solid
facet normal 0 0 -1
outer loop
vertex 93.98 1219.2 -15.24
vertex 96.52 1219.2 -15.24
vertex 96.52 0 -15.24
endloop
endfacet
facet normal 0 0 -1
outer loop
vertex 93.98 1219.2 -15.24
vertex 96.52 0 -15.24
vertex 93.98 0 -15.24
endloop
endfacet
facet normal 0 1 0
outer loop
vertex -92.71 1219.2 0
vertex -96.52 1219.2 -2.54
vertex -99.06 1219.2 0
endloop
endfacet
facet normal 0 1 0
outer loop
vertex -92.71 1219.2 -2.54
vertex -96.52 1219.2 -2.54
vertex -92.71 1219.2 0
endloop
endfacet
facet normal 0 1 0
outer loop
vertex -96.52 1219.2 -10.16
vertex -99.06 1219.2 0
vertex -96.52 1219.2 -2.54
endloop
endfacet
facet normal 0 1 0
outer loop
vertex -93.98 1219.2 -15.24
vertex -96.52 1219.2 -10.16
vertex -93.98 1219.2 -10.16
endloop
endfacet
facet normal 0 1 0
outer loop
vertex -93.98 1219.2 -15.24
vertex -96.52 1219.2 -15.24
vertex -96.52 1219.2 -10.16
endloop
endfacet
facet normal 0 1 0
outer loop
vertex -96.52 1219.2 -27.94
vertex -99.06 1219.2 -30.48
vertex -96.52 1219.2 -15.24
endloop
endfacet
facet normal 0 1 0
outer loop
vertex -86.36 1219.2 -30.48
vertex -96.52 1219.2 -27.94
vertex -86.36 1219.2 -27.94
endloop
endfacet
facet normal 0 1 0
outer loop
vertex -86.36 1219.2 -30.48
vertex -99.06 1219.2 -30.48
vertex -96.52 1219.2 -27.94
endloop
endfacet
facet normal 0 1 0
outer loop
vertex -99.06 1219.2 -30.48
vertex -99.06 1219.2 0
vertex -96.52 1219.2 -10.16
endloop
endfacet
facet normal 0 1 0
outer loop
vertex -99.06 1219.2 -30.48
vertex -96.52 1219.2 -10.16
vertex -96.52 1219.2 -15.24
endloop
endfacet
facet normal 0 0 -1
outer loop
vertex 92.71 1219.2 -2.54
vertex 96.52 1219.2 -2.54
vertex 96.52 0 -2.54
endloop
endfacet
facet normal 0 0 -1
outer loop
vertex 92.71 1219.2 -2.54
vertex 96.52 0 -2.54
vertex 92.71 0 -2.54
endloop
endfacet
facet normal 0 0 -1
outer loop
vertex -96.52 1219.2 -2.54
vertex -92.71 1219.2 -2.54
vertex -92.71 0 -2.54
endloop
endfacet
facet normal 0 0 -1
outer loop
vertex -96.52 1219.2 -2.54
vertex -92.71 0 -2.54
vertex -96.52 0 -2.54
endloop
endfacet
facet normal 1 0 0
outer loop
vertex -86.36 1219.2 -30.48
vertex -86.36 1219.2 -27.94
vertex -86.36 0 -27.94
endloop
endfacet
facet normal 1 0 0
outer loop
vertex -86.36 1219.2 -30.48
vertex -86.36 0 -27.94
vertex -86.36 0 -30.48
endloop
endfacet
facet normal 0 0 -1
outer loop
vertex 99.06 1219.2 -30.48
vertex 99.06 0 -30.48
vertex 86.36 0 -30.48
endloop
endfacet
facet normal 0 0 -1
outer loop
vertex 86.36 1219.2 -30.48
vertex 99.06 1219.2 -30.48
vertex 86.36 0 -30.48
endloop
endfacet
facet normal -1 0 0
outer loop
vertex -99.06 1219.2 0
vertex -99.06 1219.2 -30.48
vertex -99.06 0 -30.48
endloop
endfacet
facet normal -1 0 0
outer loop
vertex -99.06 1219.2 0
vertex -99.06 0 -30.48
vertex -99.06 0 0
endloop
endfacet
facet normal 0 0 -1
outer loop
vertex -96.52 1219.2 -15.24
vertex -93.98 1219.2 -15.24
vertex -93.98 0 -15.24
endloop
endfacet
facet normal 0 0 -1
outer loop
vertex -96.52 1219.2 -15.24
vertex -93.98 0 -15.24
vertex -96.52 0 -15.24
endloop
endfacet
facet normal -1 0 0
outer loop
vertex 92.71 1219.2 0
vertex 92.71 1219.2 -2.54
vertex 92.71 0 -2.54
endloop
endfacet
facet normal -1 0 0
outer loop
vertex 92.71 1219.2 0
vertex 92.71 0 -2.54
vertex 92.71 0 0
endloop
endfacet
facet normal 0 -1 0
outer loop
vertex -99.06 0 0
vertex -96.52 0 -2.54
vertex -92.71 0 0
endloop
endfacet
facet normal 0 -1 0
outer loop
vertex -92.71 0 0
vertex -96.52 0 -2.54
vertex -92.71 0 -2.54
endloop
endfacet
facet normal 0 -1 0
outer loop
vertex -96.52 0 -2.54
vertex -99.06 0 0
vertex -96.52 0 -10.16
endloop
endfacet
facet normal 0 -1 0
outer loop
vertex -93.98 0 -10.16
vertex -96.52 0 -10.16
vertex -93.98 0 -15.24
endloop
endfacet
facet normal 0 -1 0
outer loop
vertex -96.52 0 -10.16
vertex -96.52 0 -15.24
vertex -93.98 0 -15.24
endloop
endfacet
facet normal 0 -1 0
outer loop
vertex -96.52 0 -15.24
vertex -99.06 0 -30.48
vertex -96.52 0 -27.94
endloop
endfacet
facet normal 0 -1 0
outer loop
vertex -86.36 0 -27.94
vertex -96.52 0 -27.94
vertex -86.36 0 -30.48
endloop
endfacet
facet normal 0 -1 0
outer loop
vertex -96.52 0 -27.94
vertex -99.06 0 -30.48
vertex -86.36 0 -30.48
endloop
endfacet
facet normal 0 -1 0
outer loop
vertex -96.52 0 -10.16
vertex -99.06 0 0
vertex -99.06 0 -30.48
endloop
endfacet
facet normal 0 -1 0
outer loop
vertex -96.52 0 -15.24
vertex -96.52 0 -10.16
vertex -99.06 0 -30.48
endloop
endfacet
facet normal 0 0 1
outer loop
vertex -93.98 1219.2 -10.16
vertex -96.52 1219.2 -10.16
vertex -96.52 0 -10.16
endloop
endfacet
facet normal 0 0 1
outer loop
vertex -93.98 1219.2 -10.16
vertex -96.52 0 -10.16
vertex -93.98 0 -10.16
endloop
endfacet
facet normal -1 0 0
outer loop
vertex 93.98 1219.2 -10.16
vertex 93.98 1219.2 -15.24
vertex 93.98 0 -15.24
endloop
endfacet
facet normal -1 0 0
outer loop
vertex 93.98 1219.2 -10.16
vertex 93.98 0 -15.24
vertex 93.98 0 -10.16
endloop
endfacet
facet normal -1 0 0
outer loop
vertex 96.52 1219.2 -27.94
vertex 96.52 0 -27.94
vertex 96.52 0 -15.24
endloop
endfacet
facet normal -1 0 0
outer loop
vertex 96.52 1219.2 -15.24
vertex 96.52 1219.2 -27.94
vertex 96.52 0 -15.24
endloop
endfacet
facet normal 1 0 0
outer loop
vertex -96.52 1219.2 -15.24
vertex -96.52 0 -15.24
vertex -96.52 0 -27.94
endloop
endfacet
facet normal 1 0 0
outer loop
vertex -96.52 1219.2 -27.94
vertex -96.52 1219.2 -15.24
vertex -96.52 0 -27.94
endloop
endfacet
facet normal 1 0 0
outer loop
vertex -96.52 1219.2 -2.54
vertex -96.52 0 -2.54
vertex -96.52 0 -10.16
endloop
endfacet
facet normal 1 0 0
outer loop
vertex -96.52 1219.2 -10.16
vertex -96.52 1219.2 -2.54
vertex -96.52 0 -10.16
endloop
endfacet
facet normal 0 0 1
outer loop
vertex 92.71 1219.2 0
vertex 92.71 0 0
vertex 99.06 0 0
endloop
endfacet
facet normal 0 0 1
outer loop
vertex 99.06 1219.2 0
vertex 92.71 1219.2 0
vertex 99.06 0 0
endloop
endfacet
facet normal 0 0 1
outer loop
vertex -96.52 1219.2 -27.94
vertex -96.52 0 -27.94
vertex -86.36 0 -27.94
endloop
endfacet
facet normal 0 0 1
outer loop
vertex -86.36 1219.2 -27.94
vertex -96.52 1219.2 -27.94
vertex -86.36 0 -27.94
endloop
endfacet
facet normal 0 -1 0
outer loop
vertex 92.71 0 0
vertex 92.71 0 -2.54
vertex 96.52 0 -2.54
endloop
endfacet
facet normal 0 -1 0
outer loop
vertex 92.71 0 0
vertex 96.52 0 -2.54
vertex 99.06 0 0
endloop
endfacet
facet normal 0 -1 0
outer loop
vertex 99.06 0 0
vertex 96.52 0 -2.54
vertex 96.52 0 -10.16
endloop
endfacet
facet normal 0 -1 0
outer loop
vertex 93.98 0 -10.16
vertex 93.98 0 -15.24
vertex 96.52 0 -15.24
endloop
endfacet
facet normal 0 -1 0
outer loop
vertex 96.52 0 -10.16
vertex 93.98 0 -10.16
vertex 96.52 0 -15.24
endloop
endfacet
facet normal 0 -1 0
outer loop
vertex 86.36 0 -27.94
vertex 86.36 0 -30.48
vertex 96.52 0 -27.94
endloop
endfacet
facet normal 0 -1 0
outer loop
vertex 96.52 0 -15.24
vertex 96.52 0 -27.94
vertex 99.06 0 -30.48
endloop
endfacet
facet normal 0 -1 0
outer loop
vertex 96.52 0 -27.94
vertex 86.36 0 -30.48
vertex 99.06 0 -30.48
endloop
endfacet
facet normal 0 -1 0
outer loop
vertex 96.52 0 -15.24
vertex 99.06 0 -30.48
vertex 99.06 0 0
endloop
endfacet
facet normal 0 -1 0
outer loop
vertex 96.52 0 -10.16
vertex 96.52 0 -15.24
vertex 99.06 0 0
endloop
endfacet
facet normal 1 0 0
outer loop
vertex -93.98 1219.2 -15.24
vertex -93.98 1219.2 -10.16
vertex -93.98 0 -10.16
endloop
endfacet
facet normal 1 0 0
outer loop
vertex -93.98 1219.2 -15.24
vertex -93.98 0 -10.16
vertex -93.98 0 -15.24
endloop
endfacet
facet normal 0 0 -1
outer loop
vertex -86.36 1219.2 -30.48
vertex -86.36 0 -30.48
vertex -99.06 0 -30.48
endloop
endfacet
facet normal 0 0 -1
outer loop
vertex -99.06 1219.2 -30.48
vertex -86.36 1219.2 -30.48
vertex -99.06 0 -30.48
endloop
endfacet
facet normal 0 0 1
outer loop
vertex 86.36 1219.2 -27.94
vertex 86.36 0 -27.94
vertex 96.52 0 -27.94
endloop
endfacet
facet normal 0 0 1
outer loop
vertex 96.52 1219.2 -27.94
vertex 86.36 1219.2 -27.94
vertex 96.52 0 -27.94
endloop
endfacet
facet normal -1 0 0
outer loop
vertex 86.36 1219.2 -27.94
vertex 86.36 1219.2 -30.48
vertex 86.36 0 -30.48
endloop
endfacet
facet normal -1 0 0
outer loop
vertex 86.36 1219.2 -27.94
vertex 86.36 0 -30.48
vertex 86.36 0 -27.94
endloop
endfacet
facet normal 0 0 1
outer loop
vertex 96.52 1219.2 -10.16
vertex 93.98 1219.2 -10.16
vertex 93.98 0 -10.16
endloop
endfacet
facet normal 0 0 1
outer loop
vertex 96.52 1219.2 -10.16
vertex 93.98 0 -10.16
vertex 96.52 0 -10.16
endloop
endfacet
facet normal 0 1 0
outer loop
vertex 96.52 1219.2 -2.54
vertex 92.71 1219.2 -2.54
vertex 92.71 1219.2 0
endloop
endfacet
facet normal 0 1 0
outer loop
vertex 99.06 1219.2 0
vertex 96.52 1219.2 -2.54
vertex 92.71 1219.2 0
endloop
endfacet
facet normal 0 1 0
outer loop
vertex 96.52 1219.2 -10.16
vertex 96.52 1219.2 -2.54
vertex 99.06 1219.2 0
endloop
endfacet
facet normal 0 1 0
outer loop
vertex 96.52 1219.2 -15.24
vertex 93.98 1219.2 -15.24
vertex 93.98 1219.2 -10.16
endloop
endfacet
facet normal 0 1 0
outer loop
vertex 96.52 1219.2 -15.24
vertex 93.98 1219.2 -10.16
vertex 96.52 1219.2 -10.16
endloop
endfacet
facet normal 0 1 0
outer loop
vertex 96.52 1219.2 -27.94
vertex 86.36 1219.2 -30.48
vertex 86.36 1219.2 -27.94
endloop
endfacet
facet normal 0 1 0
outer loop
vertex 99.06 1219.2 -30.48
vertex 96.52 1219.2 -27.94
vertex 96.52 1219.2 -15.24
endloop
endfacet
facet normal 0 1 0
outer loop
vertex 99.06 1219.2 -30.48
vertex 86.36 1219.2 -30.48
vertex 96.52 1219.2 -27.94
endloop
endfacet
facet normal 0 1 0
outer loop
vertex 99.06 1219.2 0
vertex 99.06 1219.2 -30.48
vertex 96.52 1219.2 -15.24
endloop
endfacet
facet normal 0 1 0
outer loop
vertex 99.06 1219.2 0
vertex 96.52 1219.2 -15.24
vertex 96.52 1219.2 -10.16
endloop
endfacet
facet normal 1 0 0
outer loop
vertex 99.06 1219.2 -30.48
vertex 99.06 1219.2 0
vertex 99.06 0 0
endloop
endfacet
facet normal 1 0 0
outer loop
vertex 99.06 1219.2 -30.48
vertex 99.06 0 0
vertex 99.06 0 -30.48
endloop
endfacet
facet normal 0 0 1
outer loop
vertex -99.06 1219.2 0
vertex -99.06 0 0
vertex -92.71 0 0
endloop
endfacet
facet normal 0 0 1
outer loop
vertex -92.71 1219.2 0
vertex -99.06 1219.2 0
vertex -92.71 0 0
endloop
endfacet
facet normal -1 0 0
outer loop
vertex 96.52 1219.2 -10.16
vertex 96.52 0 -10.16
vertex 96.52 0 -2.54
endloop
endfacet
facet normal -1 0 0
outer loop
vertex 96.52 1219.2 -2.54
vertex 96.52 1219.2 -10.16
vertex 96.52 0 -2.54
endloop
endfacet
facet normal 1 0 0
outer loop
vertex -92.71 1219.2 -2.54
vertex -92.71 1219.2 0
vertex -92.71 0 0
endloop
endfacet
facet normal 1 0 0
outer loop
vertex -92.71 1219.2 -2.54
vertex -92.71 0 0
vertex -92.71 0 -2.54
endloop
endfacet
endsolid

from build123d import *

# Parameters (mm, degrees)
BOSS_EXTRUDE1_DEPTH   = 1219.2
BOSS_EXTRUDE1_2_DEPTH = 1219.2


with BuildPart() as part:
    # Sketch1 → Boss-Extrude1 (new body)
    with BuildSketch(Plane(origin=(0, 0, 0), x_dir=(1, 0, 0), z_dir=(0, 1, 0))):
        Polygon((-99.06, 0), (-92.71, 0), (-92.71, 2.54), (-96.52, 2.54), (-96.52, 10.16), (-93.98, 10.16), (-93.98, 15.24), (-96.52, 15.24), (-96.52, 27.94), (-86.36, 27.94), (-86.36, 30.48), (-99.06, 30.48), align=None)
    extrude(amount=BOSS_EXTRUDE1_DEPTH)


with BuildPart() as body_2:
    # Sketch1 → Boss-Extrude1 2 (new body)
    with BuildSketch(Plane(origin=(0, 0, 0), x_dir=(1, 0, 0), z_dir=(0, 1, 0))):
        Polygon((96.52, 2.54), (92.71, 2.54), (92.71, 0), (99.06, 0), (99.06, 30.48), (86.36, 30.48), (86.36, 27.94), (96.52, 27.94), (96.52, 15.24), (93.98, 15.24), (93.98, 10.16), (96.52, 10.16), align=None)
    extrude(amount=BOSS_EXTRUDE1_2_DEPTH)


solid = Compound([part.part, body_2.part])
